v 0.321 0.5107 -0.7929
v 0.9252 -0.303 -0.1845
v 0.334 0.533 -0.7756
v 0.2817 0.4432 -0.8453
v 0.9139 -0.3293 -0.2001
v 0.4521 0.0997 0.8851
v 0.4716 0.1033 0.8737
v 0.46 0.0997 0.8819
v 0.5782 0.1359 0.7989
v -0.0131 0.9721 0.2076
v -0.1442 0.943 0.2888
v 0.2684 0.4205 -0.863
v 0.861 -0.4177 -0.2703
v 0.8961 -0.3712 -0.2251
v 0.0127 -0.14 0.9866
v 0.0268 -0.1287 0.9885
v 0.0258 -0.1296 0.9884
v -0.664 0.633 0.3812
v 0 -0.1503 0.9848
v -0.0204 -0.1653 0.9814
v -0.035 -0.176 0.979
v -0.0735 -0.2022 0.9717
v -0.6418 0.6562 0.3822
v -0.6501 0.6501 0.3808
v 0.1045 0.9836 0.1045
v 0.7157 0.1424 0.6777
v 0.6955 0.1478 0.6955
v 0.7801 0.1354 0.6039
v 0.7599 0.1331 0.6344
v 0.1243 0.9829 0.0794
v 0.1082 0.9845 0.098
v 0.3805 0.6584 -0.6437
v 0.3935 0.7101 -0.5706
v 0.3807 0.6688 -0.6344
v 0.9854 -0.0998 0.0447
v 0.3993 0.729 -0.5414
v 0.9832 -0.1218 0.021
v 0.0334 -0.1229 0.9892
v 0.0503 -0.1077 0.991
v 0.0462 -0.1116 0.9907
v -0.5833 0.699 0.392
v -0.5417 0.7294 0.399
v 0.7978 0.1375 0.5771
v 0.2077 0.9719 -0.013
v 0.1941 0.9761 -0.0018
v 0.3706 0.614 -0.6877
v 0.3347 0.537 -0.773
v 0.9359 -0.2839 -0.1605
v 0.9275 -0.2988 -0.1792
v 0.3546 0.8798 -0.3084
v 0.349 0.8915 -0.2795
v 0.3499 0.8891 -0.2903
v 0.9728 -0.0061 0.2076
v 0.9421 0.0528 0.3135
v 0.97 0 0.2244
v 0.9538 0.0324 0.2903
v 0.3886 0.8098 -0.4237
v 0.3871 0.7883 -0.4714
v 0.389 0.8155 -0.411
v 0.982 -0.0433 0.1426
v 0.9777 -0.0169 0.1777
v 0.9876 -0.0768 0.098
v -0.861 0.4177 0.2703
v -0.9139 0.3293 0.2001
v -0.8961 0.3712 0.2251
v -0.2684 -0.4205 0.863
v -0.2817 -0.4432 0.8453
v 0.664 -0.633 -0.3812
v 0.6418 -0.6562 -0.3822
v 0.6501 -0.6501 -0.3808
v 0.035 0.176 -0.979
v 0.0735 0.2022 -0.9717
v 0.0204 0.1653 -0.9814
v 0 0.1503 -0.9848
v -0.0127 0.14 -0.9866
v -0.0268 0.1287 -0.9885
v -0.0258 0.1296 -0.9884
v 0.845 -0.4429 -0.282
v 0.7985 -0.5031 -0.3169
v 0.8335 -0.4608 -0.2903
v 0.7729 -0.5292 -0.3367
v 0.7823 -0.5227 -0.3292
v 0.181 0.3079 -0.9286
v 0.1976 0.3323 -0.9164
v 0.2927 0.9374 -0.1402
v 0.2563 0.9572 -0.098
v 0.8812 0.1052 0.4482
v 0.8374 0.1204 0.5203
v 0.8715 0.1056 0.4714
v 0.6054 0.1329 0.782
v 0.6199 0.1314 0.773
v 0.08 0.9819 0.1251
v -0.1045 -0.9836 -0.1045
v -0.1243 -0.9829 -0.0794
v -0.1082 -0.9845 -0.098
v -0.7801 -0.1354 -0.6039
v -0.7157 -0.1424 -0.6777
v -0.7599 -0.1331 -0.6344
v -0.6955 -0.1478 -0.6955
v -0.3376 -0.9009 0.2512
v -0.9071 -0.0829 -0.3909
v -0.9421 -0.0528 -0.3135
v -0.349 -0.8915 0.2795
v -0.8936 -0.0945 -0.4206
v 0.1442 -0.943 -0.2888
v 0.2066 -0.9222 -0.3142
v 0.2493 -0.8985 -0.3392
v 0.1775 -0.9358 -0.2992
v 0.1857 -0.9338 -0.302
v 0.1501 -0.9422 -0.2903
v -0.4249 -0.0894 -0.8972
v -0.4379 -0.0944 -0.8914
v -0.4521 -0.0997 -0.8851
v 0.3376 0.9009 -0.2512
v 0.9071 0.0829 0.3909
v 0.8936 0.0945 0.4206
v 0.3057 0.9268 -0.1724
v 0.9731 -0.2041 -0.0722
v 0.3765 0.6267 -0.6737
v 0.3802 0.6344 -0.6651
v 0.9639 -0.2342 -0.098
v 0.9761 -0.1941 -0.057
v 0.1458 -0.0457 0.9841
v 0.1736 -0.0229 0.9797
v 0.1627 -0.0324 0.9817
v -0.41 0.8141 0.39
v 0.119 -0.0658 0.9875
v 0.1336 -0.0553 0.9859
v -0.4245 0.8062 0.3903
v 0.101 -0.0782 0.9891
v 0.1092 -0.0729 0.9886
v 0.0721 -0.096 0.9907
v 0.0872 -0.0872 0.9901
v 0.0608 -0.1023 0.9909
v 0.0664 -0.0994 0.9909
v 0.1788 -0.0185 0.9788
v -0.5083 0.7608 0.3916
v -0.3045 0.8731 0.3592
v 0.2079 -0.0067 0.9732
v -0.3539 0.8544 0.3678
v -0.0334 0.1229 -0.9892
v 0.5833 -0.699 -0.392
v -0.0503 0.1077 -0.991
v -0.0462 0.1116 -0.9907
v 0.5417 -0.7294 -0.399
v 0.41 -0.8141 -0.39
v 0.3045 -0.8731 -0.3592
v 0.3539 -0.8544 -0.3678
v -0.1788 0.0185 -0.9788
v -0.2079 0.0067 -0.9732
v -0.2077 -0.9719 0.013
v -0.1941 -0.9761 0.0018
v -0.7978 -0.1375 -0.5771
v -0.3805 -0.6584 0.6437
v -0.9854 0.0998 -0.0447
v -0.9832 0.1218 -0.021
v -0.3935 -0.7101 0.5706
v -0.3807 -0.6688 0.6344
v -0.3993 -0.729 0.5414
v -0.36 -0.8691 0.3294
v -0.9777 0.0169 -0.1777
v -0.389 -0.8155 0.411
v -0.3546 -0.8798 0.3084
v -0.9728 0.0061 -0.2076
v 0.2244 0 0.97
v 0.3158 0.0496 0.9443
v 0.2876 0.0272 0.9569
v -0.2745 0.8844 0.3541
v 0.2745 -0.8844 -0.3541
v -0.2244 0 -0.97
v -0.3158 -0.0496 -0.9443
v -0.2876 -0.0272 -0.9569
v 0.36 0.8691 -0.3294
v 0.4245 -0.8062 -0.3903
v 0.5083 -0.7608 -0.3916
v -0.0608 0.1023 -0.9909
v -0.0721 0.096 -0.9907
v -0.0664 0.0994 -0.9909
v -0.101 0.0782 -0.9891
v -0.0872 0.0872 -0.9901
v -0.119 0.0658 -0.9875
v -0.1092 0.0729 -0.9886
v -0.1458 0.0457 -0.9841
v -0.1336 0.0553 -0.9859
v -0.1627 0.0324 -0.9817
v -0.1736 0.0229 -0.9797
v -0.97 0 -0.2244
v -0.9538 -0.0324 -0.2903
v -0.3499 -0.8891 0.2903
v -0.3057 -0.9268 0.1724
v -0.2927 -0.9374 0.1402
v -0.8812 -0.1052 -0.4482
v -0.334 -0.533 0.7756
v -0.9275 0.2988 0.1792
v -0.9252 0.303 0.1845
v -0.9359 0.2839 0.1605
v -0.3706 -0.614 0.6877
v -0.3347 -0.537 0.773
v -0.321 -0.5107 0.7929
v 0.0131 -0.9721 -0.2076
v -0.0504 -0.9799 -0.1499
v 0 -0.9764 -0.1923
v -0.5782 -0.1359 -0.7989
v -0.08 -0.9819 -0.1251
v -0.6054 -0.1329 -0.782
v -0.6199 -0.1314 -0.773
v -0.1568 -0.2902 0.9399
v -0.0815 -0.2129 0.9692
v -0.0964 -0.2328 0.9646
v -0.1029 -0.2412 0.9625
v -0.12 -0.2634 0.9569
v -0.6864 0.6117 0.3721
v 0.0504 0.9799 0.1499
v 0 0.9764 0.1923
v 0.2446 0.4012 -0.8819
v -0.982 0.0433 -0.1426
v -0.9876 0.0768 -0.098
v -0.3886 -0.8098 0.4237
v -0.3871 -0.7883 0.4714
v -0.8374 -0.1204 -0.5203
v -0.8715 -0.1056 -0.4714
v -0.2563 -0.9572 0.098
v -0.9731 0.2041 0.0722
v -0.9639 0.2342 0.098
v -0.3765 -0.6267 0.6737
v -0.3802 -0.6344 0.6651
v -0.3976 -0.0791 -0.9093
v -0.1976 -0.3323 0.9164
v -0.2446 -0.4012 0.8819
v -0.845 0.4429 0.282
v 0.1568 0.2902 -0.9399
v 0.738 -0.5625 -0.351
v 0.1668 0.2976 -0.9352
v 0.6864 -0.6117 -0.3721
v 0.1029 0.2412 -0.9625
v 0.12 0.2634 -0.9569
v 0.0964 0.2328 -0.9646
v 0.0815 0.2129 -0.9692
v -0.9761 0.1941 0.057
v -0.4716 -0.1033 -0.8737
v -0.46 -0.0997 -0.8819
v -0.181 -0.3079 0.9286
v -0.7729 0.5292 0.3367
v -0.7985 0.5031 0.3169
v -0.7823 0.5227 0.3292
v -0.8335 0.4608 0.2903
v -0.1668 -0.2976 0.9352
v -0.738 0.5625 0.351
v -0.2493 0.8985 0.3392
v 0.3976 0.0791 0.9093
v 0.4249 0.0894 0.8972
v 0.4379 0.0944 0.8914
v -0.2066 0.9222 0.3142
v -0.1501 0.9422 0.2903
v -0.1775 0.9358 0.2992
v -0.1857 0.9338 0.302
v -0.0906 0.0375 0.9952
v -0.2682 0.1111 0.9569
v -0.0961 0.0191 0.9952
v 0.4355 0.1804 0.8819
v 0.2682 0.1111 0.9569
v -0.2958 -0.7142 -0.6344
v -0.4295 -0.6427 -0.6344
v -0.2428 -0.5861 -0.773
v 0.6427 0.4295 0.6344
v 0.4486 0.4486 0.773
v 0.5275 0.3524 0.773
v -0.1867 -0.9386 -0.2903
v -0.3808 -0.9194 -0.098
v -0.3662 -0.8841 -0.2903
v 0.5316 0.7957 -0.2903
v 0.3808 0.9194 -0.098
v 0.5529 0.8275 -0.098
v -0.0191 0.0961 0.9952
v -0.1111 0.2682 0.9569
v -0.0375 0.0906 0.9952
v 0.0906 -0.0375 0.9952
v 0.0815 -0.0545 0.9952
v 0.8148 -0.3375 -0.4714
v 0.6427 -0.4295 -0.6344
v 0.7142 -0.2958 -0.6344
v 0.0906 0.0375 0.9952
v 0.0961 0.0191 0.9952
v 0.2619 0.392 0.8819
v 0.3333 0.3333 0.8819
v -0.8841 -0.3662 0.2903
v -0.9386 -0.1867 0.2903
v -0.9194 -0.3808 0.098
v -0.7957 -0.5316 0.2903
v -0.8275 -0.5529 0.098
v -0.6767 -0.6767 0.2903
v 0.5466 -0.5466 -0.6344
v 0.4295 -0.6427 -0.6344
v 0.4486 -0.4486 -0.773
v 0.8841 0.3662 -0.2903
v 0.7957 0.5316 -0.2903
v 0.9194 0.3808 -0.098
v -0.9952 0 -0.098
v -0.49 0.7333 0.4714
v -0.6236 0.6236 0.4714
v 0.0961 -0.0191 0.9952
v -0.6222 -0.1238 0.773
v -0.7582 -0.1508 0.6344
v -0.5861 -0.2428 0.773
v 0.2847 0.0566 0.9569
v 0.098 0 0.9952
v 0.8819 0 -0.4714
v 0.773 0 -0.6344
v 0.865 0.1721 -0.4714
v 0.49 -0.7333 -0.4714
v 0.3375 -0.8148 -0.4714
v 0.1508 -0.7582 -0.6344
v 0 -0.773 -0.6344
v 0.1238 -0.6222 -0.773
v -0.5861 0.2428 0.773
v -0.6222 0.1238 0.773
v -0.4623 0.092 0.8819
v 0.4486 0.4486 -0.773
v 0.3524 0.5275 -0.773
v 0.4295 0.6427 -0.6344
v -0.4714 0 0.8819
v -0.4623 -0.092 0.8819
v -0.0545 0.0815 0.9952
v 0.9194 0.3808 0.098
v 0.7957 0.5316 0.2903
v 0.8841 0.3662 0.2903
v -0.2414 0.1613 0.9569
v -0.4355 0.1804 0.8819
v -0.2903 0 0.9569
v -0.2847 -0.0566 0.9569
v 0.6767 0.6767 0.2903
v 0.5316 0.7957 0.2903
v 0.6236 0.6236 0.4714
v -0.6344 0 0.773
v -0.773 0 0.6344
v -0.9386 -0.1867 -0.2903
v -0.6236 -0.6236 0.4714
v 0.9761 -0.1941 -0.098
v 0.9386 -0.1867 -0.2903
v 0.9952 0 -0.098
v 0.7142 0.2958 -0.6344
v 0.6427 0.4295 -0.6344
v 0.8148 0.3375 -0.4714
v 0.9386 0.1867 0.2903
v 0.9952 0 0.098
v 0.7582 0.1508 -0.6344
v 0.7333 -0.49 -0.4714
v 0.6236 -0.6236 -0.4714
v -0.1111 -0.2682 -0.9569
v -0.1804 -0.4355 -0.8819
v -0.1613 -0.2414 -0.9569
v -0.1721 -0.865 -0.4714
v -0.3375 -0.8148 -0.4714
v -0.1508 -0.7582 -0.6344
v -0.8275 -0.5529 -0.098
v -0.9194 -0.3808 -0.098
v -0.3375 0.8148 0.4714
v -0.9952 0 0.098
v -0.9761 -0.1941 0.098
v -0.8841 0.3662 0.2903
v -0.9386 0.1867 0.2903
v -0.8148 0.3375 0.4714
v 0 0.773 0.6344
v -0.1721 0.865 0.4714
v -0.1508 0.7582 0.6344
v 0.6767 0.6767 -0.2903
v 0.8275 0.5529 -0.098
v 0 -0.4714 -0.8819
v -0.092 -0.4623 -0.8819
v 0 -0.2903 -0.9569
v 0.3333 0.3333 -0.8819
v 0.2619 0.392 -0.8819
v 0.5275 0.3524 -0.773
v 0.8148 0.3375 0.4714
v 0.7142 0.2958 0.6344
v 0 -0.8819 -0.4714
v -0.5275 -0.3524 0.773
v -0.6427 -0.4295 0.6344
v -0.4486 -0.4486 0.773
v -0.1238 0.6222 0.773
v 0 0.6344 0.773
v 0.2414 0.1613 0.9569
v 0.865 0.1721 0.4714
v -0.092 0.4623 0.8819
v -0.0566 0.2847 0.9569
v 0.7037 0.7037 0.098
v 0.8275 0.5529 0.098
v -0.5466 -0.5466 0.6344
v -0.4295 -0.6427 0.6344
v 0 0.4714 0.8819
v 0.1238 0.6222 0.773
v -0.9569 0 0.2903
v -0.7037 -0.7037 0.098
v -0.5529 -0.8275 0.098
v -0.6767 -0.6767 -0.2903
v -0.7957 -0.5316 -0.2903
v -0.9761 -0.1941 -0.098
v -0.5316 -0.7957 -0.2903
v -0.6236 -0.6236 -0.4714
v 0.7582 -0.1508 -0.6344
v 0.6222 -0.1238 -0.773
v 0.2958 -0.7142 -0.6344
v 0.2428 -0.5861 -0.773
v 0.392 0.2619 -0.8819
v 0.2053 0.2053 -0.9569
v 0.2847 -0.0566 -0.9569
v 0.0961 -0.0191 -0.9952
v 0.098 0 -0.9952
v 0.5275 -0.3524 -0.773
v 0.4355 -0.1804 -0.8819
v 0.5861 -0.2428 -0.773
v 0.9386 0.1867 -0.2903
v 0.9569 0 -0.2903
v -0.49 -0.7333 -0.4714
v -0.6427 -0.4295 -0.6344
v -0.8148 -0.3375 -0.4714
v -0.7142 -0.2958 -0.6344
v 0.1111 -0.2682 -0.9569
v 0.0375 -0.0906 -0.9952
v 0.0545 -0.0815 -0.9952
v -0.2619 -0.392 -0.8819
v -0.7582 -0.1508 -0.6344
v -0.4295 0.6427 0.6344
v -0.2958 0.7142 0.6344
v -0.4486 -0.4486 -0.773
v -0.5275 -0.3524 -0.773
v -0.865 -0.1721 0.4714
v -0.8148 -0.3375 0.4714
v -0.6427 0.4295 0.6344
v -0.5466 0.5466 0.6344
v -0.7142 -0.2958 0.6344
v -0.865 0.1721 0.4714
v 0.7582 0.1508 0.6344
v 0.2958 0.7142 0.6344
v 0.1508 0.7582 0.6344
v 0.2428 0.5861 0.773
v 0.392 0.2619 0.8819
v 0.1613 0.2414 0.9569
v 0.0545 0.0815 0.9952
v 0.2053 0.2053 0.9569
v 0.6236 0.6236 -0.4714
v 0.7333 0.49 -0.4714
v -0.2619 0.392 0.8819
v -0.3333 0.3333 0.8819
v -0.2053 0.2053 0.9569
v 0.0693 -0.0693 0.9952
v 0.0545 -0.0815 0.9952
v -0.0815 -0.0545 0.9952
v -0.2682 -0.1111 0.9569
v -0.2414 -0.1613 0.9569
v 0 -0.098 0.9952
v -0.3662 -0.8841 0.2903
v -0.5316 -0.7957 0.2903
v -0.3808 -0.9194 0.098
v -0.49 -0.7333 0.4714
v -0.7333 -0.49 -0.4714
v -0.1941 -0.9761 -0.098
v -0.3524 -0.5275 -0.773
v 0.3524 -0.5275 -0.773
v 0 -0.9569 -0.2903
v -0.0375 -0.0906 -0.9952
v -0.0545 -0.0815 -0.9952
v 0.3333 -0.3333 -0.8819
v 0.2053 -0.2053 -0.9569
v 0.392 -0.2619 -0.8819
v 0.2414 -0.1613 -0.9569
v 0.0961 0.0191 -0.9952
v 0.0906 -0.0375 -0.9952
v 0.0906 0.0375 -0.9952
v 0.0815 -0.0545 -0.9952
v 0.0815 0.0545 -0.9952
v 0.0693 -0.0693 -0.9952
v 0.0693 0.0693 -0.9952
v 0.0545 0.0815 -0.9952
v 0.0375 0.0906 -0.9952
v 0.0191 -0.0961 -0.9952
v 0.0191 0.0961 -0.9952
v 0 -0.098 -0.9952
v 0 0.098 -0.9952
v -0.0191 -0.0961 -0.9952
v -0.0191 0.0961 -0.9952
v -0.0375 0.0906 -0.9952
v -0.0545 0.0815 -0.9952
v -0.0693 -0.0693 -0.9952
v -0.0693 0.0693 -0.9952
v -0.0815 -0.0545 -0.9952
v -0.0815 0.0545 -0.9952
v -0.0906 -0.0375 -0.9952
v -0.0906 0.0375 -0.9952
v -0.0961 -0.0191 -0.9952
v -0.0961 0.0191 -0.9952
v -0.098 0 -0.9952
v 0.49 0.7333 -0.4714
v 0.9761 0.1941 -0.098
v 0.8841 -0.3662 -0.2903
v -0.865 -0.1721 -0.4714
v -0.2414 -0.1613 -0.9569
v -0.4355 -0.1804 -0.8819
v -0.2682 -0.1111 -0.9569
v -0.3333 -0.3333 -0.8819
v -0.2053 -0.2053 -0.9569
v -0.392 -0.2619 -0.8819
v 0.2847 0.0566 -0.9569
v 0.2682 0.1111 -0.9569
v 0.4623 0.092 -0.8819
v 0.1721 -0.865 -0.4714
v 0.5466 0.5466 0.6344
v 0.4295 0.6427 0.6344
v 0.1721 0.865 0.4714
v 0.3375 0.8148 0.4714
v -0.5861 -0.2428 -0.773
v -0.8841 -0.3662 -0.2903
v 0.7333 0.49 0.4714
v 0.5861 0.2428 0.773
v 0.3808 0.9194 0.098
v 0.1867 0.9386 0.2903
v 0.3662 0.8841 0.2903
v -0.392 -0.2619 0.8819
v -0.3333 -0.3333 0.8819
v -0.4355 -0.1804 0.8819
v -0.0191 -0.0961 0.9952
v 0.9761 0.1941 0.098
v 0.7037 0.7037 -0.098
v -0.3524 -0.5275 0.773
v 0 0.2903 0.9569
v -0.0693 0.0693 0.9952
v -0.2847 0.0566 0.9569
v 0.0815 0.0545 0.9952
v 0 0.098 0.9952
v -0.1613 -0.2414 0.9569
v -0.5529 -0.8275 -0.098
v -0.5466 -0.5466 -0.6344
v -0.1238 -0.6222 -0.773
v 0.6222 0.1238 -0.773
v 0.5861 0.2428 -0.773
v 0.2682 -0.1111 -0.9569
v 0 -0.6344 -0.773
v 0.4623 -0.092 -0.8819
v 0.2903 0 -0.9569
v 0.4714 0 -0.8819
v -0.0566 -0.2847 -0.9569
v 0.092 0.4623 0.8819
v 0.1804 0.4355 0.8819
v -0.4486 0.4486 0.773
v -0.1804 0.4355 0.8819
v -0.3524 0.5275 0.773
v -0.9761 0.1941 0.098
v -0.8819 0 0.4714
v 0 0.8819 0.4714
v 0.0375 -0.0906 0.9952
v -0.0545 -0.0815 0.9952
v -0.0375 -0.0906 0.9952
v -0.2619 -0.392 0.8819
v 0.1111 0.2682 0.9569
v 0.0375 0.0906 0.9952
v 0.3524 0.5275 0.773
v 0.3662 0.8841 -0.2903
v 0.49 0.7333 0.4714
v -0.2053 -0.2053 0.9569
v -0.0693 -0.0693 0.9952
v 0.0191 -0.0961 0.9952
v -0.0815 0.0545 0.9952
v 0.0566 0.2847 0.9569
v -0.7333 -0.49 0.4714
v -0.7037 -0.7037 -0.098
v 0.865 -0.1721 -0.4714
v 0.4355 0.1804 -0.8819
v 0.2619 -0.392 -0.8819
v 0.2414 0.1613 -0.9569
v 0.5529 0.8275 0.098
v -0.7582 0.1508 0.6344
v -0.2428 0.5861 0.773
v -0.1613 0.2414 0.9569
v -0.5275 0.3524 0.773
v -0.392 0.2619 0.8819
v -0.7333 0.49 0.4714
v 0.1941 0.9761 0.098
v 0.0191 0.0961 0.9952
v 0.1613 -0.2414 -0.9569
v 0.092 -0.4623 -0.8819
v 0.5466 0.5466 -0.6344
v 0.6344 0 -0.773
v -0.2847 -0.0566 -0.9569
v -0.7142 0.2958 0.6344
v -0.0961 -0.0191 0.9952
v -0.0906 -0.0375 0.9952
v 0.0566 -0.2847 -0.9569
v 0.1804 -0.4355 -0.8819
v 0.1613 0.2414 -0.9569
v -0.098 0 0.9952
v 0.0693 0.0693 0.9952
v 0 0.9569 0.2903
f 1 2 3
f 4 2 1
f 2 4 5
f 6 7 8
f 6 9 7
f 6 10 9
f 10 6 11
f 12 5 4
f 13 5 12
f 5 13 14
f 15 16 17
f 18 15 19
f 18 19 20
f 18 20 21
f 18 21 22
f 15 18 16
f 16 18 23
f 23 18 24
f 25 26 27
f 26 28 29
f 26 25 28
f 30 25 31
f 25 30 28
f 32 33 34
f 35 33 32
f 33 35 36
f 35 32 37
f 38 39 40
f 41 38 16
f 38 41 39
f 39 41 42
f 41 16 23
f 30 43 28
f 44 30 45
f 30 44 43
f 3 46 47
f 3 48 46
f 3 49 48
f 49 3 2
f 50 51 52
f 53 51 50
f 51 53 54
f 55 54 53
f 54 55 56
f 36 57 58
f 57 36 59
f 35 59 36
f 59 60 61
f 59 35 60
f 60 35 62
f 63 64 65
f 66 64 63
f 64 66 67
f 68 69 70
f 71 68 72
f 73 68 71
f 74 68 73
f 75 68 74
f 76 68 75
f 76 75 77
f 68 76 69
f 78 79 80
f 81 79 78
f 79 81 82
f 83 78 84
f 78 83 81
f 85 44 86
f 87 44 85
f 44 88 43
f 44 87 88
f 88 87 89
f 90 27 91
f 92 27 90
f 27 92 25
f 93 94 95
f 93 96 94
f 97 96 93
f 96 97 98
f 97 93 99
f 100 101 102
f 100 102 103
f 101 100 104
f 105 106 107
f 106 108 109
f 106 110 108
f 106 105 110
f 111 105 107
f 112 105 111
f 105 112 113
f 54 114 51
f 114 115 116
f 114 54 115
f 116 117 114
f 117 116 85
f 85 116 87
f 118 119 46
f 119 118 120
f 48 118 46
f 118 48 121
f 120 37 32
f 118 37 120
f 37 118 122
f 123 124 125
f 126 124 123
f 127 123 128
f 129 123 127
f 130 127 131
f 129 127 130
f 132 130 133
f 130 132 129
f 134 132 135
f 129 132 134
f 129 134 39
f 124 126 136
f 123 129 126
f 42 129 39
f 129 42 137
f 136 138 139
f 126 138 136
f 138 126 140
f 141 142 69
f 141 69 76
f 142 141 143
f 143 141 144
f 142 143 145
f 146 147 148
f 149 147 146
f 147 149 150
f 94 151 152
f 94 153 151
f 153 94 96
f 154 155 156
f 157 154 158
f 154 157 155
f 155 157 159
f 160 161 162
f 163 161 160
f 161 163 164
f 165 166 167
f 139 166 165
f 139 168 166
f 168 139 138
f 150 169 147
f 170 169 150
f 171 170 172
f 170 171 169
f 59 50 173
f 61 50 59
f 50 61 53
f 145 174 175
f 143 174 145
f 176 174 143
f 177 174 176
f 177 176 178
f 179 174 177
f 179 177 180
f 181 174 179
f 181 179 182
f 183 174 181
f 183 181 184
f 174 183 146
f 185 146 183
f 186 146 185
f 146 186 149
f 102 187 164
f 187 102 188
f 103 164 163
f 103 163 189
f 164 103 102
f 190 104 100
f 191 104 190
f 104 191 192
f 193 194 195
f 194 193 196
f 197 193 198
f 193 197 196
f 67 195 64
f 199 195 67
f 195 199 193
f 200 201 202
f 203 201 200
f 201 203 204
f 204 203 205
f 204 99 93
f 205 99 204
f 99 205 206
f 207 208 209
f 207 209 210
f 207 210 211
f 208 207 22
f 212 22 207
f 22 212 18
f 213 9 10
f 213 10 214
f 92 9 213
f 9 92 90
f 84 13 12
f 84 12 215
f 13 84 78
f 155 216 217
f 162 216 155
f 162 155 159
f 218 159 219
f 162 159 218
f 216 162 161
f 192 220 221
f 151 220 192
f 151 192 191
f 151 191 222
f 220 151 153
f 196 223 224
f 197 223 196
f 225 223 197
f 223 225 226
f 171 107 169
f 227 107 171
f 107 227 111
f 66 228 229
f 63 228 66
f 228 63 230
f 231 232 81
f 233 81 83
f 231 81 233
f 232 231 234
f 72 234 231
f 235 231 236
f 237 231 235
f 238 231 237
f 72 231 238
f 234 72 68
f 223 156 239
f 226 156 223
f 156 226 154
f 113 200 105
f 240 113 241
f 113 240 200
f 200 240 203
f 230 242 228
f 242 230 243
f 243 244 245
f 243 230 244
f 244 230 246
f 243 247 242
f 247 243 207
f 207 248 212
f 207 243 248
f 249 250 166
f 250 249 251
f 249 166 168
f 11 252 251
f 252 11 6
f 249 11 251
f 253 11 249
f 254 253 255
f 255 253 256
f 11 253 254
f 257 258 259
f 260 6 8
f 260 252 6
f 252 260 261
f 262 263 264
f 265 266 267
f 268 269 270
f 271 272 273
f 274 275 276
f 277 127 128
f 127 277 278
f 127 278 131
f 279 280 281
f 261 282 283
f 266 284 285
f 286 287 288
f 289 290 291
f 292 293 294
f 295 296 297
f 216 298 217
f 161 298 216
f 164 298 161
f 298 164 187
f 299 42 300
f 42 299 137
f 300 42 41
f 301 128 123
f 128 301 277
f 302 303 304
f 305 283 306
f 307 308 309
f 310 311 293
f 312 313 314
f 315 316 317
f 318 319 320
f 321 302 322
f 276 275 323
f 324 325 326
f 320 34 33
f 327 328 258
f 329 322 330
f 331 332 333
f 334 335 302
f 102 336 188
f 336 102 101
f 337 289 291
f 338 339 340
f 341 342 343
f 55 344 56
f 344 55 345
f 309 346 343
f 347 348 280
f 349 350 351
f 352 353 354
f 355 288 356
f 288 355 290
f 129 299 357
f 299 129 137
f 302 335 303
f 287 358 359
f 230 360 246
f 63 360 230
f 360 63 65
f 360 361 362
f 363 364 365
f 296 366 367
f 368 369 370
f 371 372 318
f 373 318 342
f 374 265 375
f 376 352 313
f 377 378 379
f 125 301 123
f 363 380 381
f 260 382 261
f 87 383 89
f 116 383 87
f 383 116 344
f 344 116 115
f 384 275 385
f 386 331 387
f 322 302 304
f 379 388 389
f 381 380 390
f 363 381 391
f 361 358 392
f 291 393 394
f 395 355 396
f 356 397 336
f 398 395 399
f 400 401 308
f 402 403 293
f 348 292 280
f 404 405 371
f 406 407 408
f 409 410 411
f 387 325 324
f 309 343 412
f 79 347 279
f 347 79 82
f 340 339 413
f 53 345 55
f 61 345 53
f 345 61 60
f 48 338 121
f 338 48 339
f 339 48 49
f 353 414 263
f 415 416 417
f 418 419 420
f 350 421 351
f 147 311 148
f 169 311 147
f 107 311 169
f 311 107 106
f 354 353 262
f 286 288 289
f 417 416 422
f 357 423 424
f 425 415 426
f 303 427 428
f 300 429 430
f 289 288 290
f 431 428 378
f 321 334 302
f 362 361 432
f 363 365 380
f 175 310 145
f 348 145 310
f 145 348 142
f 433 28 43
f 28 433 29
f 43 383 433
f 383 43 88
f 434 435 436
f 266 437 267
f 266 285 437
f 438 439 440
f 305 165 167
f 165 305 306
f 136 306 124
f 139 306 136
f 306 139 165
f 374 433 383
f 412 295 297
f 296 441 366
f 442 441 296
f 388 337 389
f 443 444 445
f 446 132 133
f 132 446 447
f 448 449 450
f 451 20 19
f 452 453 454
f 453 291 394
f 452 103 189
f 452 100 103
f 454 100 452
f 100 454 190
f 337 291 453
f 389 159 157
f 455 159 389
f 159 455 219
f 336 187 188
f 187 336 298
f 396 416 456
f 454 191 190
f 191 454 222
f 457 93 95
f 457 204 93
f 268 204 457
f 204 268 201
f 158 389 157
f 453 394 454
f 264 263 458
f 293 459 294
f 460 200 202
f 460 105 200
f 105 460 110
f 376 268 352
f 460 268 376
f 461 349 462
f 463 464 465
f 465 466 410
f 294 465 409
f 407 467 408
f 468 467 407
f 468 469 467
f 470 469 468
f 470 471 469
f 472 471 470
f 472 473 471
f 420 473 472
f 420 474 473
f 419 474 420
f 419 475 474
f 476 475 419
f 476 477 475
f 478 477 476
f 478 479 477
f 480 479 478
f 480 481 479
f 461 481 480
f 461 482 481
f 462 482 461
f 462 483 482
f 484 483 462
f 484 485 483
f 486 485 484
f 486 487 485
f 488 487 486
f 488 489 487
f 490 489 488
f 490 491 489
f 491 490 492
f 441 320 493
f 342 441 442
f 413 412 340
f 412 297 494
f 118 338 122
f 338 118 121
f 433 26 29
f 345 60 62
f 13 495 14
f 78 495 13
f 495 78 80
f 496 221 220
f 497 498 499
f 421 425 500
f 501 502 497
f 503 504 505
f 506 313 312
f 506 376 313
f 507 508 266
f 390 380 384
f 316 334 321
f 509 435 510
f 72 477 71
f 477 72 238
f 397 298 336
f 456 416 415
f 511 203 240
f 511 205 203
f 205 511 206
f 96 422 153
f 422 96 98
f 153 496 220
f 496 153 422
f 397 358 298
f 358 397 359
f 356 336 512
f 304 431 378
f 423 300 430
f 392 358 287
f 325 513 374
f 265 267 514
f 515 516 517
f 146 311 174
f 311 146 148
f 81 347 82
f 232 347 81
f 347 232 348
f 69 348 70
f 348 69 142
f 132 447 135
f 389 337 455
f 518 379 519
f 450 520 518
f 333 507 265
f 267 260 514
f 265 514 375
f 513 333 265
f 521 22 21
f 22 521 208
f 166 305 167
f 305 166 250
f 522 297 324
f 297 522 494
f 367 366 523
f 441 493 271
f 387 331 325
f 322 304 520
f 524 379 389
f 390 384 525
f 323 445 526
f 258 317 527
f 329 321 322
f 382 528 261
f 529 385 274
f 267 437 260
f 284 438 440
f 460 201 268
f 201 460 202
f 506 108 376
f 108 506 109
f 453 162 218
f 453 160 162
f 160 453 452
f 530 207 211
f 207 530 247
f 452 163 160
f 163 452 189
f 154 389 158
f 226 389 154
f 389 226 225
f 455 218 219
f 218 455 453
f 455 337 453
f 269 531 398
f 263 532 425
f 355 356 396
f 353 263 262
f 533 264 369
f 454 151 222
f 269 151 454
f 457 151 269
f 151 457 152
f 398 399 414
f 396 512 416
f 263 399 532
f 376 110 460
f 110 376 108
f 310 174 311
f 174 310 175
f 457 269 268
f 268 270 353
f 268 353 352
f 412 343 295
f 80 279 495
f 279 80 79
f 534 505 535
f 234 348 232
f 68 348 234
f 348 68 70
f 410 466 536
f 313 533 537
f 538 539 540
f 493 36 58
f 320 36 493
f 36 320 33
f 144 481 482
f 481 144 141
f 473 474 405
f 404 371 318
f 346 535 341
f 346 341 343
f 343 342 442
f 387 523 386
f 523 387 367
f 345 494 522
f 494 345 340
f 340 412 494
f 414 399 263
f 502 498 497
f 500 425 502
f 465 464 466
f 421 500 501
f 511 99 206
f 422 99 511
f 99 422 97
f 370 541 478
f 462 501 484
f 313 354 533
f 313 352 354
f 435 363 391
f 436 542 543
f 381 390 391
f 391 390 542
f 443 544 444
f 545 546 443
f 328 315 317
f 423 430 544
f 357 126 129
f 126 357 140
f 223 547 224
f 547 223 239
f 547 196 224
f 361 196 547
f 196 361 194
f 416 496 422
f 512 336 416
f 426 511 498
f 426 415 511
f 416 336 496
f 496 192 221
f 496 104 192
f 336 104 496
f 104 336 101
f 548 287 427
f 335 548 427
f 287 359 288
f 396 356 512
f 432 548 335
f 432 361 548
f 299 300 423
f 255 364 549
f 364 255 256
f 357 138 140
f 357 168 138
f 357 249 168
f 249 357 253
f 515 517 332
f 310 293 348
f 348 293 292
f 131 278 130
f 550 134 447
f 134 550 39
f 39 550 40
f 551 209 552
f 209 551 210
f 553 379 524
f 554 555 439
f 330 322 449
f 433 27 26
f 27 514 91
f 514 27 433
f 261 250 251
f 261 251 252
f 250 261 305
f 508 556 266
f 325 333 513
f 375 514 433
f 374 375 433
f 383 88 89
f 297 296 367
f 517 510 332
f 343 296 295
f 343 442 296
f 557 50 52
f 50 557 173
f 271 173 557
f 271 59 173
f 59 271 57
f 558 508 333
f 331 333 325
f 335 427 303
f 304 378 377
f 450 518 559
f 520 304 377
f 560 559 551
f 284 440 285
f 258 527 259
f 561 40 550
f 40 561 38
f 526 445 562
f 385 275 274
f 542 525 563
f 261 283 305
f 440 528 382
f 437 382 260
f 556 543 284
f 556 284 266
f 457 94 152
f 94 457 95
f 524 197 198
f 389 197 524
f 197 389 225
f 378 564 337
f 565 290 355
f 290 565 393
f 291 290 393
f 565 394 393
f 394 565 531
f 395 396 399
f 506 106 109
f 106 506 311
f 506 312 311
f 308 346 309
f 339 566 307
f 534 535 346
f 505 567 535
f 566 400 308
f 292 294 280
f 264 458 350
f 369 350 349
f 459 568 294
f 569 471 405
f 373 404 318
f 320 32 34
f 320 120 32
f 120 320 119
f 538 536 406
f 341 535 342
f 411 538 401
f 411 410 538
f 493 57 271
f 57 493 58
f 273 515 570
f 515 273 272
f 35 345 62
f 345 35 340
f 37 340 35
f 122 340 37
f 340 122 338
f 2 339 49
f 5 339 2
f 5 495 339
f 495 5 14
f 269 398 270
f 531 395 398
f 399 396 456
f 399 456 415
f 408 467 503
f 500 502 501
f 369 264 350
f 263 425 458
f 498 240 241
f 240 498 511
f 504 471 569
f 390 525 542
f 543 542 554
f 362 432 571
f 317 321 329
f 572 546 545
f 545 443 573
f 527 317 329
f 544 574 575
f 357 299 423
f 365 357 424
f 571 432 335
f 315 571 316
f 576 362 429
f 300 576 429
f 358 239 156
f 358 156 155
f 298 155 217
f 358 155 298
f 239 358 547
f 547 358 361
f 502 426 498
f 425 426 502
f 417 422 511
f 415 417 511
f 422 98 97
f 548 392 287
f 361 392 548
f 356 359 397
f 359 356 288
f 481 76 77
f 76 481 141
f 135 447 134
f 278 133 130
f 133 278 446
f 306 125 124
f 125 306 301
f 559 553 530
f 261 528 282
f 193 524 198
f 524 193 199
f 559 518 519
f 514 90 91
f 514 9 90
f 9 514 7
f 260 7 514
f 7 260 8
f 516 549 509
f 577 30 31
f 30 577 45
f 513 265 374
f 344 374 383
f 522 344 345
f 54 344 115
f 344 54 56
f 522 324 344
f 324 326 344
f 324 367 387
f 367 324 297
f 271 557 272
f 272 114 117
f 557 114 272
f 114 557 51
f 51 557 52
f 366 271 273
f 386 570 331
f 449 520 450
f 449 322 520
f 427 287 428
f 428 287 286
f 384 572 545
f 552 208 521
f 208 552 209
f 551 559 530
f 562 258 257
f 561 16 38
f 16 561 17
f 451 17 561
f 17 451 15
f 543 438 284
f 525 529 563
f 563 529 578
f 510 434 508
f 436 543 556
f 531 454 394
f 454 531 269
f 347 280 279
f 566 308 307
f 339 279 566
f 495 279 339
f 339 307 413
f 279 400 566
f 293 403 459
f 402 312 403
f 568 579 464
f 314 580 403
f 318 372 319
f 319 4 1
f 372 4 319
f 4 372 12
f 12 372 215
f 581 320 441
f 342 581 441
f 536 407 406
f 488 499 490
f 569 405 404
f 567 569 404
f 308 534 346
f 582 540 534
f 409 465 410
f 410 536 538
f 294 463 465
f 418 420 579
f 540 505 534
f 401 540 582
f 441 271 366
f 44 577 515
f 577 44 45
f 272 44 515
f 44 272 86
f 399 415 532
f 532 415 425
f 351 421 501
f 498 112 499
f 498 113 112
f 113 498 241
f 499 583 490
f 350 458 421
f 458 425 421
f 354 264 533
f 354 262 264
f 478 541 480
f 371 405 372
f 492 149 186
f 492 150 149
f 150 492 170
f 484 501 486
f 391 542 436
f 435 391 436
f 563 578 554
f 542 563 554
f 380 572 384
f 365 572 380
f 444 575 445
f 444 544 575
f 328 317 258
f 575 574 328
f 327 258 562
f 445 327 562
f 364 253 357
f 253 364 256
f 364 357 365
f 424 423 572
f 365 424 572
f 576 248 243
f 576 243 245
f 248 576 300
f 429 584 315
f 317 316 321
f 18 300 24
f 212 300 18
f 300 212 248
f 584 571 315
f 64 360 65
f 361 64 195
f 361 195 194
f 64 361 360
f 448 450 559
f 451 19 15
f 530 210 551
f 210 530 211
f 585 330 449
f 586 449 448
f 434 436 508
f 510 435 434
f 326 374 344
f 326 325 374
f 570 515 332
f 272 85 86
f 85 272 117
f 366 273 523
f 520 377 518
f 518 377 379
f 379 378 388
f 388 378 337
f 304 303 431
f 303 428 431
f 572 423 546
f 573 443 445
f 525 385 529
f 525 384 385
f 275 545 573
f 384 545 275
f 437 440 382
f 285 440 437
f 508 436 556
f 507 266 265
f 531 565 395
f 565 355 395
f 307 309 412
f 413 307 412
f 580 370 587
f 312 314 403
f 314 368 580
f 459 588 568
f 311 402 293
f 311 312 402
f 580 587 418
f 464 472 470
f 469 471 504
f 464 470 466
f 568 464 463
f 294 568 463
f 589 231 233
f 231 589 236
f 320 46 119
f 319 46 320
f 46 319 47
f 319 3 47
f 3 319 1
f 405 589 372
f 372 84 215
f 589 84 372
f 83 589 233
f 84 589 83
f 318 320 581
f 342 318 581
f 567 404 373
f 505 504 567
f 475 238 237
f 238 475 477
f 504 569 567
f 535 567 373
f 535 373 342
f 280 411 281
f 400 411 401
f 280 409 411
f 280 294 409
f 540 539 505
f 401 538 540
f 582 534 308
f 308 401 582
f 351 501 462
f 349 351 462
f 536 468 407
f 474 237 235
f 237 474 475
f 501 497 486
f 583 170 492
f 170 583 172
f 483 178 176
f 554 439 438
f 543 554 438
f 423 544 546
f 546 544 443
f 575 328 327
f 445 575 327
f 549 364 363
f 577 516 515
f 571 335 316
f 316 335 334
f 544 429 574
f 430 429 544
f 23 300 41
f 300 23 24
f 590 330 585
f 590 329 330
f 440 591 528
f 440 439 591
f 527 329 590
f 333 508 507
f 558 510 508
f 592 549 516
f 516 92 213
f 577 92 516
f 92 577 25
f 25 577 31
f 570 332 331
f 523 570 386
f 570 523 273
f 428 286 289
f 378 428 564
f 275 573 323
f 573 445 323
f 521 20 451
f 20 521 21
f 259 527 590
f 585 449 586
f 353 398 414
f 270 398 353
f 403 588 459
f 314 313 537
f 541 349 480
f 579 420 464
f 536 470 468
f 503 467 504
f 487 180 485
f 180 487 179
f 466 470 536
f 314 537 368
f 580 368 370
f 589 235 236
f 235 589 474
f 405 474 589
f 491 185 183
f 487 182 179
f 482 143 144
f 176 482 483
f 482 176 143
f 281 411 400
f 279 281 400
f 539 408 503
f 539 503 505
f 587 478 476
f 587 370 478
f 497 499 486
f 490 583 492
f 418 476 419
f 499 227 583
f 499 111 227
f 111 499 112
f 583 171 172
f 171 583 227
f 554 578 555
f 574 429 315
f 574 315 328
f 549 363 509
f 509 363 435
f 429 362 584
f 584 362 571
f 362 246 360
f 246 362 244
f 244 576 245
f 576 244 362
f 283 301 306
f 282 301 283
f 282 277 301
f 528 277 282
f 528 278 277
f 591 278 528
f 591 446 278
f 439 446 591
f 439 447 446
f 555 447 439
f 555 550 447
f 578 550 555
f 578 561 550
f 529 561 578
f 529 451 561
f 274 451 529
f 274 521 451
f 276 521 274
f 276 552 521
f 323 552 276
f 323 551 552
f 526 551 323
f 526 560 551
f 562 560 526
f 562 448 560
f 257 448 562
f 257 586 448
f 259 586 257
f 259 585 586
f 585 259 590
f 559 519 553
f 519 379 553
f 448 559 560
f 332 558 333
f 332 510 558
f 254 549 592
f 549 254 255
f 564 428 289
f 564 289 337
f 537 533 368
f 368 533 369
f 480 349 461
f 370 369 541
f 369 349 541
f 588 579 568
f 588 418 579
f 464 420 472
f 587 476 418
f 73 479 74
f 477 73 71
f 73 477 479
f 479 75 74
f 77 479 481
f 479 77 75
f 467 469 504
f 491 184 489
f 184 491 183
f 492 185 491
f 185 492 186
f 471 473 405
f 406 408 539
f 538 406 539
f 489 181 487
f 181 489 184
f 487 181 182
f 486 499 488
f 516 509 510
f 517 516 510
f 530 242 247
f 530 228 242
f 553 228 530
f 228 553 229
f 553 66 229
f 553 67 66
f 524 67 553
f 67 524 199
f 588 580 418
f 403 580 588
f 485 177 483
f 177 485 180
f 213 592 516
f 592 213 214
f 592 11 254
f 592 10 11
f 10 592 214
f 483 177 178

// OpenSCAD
$fn = 32;

// color: 0xff0000, shininess: 100
// ambientLight: 0x404040, 0.5
// directionalLight: 0xffffff, 0.8, position (1, 1, 1)

difference() {
    sphere(r = 1);
    
    // Simulate lighting effects through boolean operations
    intersection() {
        sphere(r = 1.01);
        rotate([45, 45, 0])
        cylinder(h = 2, r = 0.8, center = true);
    }
}
